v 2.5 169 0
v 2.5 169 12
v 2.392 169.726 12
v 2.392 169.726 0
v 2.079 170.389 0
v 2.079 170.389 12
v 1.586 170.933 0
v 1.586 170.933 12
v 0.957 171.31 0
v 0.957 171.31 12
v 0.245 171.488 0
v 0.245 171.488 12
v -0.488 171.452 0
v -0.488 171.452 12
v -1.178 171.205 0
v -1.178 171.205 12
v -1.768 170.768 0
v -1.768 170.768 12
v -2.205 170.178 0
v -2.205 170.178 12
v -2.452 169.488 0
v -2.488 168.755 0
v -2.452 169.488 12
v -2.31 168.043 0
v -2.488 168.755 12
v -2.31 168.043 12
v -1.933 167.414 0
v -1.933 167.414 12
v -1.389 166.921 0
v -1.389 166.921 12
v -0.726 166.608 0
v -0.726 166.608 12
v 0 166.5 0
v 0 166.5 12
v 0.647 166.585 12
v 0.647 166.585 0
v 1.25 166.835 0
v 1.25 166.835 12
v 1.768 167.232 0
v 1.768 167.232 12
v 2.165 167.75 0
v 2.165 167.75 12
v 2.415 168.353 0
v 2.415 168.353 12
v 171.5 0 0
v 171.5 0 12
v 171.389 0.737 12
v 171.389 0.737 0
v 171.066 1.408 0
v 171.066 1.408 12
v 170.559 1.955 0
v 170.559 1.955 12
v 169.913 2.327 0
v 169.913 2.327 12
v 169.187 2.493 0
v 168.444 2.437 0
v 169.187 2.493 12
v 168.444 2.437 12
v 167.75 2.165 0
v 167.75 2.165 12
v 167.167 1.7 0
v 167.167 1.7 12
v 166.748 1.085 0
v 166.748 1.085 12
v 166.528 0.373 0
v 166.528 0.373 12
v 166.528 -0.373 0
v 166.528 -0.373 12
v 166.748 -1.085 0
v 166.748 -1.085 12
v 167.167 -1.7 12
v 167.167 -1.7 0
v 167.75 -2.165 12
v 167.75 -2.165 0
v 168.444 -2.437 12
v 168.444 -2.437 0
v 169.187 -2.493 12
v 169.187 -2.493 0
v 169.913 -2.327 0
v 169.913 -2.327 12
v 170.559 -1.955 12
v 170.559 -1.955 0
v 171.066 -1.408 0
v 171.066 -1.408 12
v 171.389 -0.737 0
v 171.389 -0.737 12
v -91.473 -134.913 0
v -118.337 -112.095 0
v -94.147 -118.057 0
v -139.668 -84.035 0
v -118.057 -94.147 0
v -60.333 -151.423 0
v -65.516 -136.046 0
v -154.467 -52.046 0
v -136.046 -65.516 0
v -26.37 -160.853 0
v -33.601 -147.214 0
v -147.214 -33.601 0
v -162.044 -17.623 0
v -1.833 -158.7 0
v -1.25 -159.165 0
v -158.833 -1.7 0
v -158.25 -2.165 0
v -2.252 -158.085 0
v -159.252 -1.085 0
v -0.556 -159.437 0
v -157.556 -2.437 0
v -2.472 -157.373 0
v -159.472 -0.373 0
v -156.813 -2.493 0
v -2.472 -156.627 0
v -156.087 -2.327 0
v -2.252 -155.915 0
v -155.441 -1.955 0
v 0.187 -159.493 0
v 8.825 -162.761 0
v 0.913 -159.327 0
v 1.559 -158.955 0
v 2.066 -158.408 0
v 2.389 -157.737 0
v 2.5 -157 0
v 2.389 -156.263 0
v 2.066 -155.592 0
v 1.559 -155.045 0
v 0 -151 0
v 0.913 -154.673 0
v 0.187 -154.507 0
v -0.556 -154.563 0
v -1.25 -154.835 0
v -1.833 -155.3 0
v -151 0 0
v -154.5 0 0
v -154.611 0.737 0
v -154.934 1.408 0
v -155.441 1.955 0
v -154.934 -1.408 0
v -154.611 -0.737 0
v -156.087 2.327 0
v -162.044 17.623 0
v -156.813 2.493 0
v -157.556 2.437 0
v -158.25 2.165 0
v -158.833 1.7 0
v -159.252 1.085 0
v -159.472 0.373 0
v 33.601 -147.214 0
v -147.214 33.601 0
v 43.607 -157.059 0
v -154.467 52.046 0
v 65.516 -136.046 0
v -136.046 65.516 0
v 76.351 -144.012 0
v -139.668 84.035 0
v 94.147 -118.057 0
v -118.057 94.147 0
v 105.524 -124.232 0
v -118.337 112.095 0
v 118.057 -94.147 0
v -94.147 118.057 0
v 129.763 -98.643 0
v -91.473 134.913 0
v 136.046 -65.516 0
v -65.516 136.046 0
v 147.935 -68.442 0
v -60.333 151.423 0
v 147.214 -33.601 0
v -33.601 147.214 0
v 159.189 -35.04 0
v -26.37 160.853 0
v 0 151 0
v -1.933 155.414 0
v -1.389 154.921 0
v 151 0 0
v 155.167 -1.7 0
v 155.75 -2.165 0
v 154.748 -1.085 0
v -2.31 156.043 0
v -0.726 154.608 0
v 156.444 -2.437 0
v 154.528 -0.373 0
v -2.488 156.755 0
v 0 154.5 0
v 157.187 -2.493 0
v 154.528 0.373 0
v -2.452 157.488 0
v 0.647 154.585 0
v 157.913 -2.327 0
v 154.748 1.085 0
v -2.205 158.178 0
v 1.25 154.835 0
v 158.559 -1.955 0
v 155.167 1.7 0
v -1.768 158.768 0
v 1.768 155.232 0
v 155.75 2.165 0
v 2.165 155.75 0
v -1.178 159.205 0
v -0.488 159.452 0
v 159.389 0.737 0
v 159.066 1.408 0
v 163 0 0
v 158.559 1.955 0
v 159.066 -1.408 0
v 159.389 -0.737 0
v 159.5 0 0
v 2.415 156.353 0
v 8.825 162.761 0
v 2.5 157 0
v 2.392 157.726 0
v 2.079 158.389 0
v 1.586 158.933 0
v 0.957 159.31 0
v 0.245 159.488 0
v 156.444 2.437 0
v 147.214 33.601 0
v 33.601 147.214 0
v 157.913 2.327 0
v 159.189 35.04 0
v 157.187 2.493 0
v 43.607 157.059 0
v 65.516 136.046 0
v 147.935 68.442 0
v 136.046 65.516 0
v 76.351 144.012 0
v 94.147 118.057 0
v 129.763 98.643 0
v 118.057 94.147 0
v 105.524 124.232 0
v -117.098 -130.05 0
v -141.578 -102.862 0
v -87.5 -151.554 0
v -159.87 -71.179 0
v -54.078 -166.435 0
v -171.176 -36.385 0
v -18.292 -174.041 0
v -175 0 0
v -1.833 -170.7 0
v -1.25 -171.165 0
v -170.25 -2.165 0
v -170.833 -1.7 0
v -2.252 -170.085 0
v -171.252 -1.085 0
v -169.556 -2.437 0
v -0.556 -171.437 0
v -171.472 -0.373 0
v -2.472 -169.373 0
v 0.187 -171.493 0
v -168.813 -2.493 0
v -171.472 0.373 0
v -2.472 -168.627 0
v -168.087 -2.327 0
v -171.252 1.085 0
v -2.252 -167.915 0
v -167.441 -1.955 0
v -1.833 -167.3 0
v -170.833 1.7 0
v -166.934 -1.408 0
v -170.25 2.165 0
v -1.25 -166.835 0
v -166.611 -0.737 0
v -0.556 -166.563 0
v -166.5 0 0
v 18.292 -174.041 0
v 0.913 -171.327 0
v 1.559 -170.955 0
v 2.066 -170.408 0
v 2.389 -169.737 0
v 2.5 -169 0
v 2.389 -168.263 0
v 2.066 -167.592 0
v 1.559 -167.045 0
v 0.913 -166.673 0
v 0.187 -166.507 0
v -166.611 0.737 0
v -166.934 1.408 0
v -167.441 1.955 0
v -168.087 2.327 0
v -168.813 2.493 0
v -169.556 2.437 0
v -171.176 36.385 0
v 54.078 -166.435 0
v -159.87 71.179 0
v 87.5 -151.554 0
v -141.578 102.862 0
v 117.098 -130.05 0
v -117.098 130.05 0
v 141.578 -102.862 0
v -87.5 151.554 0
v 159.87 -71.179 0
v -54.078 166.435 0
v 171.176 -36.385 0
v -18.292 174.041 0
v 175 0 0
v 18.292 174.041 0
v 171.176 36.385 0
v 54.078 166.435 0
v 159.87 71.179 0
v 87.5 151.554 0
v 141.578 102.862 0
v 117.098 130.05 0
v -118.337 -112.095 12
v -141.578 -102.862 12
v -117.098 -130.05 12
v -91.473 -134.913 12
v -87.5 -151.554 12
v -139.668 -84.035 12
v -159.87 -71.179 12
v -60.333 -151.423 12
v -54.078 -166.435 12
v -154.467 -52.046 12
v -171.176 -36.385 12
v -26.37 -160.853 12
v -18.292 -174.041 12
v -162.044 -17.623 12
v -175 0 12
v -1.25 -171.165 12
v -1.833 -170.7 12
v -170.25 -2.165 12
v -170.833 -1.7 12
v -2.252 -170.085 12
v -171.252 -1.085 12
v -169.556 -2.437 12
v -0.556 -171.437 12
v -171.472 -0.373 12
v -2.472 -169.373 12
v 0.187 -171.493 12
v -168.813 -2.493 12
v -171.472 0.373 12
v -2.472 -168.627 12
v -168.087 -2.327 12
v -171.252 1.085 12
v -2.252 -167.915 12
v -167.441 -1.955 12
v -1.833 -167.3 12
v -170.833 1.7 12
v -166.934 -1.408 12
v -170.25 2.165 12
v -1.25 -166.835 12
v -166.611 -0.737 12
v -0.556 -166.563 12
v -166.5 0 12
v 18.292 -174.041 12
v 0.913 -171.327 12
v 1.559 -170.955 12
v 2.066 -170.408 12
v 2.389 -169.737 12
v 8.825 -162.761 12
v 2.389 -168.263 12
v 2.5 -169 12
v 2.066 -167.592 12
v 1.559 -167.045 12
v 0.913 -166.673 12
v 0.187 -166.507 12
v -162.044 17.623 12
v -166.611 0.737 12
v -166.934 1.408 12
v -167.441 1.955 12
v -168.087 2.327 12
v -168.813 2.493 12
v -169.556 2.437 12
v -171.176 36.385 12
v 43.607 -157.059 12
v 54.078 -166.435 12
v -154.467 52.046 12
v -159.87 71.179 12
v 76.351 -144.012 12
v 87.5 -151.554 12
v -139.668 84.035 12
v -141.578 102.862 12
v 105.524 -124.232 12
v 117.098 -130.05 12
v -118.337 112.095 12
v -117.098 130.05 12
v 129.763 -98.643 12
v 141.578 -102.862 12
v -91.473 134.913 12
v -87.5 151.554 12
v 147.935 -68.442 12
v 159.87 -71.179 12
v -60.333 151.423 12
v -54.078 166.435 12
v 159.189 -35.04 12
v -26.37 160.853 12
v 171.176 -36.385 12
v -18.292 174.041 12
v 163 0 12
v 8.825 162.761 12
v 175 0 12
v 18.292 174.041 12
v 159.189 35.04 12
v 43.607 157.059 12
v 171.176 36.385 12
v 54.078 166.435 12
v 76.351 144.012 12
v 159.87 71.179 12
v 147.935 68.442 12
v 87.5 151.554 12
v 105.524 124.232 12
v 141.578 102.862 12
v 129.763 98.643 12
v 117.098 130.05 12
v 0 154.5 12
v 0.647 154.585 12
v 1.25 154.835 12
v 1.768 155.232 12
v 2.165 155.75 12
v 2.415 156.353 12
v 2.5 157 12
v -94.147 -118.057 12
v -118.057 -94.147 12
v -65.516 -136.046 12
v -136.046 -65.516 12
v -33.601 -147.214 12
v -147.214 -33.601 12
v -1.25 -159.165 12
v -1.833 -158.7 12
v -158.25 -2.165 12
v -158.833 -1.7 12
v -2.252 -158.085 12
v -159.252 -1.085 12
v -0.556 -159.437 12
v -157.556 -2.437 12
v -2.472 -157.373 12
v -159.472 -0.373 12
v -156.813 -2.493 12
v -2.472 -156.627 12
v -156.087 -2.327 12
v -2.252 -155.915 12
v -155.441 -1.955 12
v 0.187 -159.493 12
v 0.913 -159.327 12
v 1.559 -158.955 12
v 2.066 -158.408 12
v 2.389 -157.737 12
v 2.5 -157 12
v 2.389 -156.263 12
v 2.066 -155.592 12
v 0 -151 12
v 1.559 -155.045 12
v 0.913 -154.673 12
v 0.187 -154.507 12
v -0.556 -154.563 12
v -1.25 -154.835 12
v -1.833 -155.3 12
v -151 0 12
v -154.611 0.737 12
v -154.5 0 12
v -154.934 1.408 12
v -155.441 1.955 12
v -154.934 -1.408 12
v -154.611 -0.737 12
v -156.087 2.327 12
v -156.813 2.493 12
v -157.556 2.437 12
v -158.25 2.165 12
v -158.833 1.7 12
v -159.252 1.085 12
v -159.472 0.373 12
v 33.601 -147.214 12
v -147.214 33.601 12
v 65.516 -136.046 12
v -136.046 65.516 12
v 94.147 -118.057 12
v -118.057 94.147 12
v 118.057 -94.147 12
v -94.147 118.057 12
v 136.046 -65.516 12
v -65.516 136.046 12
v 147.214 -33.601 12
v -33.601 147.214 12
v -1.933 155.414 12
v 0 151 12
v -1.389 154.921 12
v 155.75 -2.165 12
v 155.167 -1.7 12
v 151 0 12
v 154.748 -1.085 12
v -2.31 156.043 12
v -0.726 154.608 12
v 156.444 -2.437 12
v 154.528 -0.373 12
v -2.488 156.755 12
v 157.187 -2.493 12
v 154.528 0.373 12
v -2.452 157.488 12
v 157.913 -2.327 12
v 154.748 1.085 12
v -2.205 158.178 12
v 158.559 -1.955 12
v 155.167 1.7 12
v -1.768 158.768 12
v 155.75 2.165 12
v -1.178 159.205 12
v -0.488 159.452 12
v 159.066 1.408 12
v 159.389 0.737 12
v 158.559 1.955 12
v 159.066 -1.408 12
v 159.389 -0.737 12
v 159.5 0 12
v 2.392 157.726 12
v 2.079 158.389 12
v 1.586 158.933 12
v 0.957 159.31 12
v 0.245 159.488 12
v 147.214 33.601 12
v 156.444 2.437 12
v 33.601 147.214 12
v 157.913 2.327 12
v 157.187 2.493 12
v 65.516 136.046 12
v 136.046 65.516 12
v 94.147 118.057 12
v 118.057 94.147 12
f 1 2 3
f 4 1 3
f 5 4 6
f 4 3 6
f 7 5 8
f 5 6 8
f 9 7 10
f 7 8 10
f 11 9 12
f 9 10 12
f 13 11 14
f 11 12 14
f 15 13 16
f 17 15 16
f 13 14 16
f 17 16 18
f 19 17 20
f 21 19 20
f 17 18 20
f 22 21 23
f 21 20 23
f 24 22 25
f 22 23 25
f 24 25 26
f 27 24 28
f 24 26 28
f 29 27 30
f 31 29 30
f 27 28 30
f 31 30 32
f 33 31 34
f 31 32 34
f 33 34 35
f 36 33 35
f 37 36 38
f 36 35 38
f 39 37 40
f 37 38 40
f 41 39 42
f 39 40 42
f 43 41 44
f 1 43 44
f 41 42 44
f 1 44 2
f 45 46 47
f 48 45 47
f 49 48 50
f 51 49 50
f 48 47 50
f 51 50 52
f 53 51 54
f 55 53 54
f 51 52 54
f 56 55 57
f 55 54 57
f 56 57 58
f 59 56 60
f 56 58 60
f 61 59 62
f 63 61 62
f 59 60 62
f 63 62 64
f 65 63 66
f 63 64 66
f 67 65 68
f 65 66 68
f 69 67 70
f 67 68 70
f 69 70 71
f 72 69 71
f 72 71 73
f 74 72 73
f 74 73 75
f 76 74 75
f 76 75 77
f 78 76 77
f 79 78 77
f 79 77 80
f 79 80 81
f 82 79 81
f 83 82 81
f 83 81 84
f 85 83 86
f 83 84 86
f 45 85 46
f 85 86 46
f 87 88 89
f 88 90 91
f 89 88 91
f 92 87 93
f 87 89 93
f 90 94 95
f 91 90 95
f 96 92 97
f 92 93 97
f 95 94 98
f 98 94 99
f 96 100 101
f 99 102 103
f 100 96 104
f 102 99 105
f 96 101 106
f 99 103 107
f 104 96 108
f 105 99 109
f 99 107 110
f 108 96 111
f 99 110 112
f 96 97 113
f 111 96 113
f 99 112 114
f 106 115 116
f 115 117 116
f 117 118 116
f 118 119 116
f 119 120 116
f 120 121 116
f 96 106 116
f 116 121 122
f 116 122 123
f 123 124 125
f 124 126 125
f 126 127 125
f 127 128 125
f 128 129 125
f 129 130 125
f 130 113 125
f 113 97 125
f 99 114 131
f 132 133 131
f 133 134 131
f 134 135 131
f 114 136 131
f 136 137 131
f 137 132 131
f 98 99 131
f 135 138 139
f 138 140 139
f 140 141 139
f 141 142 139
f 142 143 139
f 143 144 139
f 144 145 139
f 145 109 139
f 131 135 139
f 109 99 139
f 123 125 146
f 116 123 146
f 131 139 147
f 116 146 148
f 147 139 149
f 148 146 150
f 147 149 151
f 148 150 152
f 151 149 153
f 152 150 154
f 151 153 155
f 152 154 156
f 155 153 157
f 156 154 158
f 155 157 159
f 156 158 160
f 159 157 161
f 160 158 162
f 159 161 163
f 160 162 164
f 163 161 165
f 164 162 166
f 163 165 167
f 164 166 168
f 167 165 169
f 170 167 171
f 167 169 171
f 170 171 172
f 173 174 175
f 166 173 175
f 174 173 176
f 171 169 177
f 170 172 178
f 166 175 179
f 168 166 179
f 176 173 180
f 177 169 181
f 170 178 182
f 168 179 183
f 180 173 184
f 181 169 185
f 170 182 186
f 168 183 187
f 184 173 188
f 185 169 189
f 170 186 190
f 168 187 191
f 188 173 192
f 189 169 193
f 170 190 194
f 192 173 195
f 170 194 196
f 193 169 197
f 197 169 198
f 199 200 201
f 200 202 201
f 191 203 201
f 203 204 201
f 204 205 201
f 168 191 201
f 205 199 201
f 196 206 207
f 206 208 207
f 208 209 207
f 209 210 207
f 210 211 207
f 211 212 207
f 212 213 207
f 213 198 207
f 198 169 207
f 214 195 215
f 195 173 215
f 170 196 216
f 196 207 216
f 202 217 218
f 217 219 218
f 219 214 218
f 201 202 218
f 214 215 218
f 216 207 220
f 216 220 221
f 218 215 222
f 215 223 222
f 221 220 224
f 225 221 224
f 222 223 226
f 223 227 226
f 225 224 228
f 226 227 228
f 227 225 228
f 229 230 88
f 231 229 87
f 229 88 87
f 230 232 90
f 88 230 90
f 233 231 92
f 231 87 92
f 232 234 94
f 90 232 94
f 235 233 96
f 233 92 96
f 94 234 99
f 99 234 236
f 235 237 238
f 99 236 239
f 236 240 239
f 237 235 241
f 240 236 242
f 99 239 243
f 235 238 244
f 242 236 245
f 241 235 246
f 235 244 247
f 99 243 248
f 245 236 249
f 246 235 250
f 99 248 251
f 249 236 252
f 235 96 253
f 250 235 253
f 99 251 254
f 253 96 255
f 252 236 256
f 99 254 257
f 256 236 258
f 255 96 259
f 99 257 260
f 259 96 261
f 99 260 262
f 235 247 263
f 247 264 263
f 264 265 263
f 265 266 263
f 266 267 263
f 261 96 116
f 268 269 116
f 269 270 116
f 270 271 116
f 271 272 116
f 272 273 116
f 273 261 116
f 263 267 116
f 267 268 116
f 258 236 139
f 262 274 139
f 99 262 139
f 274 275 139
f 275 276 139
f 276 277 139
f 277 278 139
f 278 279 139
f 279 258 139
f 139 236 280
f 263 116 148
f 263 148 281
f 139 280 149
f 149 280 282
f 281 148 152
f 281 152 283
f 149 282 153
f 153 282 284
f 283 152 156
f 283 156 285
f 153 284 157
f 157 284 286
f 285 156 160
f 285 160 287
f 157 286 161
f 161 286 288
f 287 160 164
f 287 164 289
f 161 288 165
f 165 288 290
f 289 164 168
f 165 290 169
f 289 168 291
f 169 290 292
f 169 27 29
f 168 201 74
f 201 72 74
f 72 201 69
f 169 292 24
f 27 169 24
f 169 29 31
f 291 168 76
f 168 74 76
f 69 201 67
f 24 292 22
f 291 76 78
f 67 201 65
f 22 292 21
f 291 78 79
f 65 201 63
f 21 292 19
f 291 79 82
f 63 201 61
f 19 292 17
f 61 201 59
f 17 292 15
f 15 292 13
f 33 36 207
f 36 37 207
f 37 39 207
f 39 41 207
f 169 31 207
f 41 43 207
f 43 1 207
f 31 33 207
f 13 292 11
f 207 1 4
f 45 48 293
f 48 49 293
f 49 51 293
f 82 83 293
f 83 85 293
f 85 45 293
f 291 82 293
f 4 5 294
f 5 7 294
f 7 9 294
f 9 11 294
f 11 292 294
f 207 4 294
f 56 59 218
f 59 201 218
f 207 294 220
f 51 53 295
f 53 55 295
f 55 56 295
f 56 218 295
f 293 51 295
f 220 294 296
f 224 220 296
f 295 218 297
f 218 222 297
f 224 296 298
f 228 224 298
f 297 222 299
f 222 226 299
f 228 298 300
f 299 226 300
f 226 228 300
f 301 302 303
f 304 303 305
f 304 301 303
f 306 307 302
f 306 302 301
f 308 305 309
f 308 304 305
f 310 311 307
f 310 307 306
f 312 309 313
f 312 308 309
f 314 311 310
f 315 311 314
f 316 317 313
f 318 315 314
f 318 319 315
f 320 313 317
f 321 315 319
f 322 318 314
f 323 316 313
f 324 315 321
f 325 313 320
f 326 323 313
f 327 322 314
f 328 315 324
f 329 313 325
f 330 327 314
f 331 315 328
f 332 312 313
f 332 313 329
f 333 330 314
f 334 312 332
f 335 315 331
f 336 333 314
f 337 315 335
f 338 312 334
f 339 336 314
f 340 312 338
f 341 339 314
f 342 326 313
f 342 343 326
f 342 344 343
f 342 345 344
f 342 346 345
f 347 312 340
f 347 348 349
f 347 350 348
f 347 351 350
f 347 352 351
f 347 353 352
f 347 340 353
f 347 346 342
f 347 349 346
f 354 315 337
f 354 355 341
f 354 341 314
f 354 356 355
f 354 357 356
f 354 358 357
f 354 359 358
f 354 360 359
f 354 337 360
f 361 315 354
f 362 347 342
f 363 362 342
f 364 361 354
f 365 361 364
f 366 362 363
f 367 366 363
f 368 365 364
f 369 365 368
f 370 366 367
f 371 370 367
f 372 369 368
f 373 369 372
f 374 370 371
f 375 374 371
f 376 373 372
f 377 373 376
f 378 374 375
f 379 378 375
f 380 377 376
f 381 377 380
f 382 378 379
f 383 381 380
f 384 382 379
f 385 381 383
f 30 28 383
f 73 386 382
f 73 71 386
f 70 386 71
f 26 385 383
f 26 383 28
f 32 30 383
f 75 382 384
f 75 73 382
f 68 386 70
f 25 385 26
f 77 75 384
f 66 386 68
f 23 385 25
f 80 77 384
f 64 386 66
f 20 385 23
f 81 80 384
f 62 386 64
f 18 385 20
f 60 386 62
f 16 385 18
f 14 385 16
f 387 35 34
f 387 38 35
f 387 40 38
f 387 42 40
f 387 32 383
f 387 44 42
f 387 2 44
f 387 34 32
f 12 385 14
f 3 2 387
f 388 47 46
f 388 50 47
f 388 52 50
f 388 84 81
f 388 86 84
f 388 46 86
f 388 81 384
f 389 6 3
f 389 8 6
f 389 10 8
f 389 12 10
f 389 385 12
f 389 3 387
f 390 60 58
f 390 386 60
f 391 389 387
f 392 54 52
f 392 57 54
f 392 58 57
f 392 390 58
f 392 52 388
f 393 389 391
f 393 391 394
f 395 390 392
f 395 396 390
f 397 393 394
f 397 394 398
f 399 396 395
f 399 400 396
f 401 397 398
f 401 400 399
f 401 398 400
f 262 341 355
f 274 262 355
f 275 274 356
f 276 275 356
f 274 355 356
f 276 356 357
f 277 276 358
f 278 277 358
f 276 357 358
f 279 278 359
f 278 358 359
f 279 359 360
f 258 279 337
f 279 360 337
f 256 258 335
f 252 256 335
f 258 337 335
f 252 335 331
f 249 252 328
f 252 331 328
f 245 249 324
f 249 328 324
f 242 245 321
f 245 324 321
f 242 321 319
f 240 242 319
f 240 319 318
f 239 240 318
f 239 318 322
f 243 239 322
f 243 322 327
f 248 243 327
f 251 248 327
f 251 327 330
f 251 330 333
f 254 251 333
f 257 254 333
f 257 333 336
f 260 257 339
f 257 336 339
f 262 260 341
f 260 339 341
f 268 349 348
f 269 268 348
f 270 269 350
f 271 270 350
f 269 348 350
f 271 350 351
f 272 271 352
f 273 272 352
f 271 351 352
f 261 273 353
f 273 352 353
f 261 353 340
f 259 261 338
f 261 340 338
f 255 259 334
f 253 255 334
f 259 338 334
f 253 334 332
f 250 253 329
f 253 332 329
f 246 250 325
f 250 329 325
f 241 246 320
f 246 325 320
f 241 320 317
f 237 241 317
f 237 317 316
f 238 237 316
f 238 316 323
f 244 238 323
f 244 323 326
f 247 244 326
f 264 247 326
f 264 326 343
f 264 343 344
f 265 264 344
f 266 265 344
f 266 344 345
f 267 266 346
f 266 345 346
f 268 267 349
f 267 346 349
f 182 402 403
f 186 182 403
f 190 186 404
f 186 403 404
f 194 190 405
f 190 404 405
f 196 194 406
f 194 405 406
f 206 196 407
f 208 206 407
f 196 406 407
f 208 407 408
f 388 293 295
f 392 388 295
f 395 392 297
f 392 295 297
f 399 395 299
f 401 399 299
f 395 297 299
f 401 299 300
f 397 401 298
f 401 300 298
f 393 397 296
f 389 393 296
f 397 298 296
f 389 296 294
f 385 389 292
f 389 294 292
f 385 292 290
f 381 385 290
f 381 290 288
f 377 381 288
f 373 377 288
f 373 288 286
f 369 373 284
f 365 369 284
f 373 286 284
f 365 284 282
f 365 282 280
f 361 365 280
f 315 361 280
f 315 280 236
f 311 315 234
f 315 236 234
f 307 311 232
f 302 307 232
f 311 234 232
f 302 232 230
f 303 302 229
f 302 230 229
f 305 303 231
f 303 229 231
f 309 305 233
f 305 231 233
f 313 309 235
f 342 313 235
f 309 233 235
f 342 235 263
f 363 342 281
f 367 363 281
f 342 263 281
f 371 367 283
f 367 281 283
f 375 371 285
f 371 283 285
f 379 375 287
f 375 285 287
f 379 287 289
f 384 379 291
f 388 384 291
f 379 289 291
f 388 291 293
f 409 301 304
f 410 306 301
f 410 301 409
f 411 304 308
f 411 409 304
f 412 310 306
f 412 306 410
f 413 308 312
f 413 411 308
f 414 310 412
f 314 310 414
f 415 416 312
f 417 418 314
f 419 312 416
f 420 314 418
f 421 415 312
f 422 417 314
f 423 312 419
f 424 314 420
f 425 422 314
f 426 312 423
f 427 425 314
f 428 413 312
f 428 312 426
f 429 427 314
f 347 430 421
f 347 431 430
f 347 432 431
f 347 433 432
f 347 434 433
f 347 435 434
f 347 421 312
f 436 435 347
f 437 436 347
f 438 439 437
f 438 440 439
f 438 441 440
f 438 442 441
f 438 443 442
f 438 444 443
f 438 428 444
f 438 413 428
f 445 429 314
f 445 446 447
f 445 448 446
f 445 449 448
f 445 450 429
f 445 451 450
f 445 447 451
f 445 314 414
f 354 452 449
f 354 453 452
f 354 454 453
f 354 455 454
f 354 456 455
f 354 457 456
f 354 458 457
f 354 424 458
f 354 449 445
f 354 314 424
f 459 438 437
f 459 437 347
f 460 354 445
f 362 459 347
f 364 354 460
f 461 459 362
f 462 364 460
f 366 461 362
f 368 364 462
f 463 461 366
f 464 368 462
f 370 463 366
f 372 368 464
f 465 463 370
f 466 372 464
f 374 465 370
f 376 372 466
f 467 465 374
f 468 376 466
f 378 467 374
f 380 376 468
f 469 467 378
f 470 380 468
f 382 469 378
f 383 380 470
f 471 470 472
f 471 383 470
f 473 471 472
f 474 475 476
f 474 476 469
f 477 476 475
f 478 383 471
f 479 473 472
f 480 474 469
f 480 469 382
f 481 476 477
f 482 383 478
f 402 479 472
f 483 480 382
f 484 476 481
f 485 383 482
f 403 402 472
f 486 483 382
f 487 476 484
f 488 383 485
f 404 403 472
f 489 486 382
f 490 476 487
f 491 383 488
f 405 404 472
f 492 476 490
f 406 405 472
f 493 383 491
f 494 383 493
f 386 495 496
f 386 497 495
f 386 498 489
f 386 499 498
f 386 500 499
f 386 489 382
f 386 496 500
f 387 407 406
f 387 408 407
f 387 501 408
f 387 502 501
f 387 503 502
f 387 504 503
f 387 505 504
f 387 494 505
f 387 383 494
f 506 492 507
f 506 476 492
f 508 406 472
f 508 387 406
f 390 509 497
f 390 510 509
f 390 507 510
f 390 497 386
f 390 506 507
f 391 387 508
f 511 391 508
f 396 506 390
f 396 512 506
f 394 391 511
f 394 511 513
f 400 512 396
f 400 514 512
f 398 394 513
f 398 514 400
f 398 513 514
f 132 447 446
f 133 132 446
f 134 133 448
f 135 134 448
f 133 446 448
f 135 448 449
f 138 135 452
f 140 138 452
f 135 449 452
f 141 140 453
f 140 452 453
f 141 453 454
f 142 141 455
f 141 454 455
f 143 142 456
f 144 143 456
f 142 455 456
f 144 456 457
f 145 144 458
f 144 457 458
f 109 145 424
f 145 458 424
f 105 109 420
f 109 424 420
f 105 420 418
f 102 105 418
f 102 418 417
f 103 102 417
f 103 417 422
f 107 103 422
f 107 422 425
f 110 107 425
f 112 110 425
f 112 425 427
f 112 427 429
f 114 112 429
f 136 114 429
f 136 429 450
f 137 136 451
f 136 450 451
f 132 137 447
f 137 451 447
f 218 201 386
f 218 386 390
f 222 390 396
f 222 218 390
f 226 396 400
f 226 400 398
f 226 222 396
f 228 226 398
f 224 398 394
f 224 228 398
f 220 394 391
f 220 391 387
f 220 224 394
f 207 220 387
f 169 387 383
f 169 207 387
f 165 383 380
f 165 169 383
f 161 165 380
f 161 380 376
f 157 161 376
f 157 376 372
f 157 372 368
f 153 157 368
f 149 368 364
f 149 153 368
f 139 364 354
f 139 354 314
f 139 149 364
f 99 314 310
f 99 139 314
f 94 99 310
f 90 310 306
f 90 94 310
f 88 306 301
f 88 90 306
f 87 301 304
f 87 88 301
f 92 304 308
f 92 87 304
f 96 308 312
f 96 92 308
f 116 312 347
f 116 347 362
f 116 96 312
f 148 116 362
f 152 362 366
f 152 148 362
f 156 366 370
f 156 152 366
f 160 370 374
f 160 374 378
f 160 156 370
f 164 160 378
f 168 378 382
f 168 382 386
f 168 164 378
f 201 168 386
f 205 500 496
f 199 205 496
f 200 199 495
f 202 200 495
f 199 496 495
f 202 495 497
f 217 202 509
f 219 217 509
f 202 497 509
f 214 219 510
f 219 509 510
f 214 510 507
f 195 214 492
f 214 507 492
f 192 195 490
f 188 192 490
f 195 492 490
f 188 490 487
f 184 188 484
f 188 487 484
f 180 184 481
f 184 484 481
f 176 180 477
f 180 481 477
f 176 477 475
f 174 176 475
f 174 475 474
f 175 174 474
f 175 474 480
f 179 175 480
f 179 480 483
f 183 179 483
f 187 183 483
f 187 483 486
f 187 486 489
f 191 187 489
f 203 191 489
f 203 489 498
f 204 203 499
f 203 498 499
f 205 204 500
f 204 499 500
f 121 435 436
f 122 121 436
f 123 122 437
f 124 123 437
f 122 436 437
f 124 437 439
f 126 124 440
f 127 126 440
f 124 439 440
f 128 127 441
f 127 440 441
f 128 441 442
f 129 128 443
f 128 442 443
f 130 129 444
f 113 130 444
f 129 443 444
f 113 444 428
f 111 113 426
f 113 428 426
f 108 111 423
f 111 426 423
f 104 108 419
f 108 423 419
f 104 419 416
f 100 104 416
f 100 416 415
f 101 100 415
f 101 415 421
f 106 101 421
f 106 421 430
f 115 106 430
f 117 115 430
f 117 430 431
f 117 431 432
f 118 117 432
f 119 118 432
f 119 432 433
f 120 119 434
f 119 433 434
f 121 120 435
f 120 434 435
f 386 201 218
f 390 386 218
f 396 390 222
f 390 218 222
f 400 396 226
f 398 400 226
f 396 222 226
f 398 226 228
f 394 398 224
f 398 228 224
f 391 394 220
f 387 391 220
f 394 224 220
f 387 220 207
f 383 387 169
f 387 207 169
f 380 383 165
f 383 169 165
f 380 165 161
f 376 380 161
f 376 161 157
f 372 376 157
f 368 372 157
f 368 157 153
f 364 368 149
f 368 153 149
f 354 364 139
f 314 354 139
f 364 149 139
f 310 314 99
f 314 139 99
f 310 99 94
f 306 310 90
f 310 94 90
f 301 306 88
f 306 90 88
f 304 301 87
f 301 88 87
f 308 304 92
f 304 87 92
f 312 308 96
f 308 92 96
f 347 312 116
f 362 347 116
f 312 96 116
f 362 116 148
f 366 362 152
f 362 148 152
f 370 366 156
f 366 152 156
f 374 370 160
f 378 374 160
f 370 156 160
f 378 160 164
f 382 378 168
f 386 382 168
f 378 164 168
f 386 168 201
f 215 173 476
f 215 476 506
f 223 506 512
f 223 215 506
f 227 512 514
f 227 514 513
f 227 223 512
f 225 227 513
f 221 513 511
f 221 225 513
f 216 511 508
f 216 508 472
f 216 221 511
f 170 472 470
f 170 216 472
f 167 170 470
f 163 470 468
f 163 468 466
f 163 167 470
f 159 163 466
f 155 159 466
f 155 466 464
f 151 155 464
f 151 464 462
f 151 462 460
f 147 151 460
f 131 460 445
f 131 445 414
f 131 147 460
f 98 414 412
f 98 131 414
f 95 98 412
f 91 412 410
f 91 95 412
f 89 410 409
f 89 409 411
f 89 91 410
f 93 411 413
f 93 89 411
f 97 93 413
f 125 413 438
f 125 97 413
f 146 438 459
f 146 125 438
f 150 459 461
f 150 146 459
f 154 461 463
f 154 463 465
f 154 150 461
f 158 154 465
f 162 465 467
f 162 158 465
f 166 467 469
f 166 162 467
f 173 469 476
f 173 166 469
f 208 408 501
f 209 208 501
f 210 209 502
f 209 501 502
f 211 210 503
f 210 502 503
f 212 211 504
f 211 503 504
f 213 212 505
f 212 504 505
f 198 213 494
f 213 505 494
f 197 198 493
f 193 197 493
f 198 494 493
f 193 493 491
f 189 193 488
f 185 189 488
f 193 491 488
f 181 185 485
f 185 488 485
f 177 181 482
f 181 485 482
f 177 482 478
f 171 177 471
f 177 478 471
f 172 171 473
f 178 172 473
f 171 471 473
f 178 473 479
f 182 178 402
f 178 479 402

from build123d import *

# Parameters (mm, degrees)
F0_R     = 175
F0_R_2   = 163
F1_DEPTH = 12
F2_R     = 163
F2_R_2   = 151
F3_DEPTH = 12
F4_R     = 2.5
F5_DEPTH = 12
F6_R     = 2.5
F7_DEPTH = 12


with BuildPart() as f1:
    # F0 (on Top) → F1 (new body)
    with BuildSketch(Plane.XY):
        Circle(F0_R)
        Circle(F0_R_2, mode=Mode.SUBTRACT)
    extrude(amount=F1_DEPTH)

    # F6 (on face) → F7 (cut)
    with BuildSketch(Plane.XY.offset(12)):
        with BuildLine():
            ThreePointArc((0, 166.5), (1.767767, 167.232233), (2.5, 169))
            ThreePointArc((2.5, 169), (-1.767767, 170.767767), (0, 166.5))
        make_face()
        with Locations((-169, 0)):
            Circle(F6_R)
        with Locations((0, -169)):
            Circle(F6_R)
        with Locations((169, 0)):
            Circle(F6_R)
    extrude(amount=-F7_DEPTH, mode=Mode.SUBTRACT)


with BuildPart() as f3:
    # F2 (on Top) → F3 (new body)
    with BuildSketch(Plane.XY):
        Circle(F2_R)
        Circle(F2_R_2, mode=Mode.SUBTRACT)
    extrude(amount=F3_DEPTH)

    # F4 (on face) → F5 (cut)
    with BuildSketch(Plane.XY.offset(12)):
        with BuildLine():
            ThreePointArc((0, 154.5), (1.767767, 155.232233), (2.5, 157))
            ThreePointArc((2.5, 157), (-1.767767, 158.767767), (0, 154.5))
        make_face()
        with Locations((-157, 0)):
            Circle(F4_R)
        with Locations((0, -157)):
            Circle(F4_R)
        with Locations((157, 0)):
            Circle(F4_R)
    extrude(amount=-F5_DEPTH, mode=Mode.SUBTRACT)


solid = Compound([f1.part, f3.part])
